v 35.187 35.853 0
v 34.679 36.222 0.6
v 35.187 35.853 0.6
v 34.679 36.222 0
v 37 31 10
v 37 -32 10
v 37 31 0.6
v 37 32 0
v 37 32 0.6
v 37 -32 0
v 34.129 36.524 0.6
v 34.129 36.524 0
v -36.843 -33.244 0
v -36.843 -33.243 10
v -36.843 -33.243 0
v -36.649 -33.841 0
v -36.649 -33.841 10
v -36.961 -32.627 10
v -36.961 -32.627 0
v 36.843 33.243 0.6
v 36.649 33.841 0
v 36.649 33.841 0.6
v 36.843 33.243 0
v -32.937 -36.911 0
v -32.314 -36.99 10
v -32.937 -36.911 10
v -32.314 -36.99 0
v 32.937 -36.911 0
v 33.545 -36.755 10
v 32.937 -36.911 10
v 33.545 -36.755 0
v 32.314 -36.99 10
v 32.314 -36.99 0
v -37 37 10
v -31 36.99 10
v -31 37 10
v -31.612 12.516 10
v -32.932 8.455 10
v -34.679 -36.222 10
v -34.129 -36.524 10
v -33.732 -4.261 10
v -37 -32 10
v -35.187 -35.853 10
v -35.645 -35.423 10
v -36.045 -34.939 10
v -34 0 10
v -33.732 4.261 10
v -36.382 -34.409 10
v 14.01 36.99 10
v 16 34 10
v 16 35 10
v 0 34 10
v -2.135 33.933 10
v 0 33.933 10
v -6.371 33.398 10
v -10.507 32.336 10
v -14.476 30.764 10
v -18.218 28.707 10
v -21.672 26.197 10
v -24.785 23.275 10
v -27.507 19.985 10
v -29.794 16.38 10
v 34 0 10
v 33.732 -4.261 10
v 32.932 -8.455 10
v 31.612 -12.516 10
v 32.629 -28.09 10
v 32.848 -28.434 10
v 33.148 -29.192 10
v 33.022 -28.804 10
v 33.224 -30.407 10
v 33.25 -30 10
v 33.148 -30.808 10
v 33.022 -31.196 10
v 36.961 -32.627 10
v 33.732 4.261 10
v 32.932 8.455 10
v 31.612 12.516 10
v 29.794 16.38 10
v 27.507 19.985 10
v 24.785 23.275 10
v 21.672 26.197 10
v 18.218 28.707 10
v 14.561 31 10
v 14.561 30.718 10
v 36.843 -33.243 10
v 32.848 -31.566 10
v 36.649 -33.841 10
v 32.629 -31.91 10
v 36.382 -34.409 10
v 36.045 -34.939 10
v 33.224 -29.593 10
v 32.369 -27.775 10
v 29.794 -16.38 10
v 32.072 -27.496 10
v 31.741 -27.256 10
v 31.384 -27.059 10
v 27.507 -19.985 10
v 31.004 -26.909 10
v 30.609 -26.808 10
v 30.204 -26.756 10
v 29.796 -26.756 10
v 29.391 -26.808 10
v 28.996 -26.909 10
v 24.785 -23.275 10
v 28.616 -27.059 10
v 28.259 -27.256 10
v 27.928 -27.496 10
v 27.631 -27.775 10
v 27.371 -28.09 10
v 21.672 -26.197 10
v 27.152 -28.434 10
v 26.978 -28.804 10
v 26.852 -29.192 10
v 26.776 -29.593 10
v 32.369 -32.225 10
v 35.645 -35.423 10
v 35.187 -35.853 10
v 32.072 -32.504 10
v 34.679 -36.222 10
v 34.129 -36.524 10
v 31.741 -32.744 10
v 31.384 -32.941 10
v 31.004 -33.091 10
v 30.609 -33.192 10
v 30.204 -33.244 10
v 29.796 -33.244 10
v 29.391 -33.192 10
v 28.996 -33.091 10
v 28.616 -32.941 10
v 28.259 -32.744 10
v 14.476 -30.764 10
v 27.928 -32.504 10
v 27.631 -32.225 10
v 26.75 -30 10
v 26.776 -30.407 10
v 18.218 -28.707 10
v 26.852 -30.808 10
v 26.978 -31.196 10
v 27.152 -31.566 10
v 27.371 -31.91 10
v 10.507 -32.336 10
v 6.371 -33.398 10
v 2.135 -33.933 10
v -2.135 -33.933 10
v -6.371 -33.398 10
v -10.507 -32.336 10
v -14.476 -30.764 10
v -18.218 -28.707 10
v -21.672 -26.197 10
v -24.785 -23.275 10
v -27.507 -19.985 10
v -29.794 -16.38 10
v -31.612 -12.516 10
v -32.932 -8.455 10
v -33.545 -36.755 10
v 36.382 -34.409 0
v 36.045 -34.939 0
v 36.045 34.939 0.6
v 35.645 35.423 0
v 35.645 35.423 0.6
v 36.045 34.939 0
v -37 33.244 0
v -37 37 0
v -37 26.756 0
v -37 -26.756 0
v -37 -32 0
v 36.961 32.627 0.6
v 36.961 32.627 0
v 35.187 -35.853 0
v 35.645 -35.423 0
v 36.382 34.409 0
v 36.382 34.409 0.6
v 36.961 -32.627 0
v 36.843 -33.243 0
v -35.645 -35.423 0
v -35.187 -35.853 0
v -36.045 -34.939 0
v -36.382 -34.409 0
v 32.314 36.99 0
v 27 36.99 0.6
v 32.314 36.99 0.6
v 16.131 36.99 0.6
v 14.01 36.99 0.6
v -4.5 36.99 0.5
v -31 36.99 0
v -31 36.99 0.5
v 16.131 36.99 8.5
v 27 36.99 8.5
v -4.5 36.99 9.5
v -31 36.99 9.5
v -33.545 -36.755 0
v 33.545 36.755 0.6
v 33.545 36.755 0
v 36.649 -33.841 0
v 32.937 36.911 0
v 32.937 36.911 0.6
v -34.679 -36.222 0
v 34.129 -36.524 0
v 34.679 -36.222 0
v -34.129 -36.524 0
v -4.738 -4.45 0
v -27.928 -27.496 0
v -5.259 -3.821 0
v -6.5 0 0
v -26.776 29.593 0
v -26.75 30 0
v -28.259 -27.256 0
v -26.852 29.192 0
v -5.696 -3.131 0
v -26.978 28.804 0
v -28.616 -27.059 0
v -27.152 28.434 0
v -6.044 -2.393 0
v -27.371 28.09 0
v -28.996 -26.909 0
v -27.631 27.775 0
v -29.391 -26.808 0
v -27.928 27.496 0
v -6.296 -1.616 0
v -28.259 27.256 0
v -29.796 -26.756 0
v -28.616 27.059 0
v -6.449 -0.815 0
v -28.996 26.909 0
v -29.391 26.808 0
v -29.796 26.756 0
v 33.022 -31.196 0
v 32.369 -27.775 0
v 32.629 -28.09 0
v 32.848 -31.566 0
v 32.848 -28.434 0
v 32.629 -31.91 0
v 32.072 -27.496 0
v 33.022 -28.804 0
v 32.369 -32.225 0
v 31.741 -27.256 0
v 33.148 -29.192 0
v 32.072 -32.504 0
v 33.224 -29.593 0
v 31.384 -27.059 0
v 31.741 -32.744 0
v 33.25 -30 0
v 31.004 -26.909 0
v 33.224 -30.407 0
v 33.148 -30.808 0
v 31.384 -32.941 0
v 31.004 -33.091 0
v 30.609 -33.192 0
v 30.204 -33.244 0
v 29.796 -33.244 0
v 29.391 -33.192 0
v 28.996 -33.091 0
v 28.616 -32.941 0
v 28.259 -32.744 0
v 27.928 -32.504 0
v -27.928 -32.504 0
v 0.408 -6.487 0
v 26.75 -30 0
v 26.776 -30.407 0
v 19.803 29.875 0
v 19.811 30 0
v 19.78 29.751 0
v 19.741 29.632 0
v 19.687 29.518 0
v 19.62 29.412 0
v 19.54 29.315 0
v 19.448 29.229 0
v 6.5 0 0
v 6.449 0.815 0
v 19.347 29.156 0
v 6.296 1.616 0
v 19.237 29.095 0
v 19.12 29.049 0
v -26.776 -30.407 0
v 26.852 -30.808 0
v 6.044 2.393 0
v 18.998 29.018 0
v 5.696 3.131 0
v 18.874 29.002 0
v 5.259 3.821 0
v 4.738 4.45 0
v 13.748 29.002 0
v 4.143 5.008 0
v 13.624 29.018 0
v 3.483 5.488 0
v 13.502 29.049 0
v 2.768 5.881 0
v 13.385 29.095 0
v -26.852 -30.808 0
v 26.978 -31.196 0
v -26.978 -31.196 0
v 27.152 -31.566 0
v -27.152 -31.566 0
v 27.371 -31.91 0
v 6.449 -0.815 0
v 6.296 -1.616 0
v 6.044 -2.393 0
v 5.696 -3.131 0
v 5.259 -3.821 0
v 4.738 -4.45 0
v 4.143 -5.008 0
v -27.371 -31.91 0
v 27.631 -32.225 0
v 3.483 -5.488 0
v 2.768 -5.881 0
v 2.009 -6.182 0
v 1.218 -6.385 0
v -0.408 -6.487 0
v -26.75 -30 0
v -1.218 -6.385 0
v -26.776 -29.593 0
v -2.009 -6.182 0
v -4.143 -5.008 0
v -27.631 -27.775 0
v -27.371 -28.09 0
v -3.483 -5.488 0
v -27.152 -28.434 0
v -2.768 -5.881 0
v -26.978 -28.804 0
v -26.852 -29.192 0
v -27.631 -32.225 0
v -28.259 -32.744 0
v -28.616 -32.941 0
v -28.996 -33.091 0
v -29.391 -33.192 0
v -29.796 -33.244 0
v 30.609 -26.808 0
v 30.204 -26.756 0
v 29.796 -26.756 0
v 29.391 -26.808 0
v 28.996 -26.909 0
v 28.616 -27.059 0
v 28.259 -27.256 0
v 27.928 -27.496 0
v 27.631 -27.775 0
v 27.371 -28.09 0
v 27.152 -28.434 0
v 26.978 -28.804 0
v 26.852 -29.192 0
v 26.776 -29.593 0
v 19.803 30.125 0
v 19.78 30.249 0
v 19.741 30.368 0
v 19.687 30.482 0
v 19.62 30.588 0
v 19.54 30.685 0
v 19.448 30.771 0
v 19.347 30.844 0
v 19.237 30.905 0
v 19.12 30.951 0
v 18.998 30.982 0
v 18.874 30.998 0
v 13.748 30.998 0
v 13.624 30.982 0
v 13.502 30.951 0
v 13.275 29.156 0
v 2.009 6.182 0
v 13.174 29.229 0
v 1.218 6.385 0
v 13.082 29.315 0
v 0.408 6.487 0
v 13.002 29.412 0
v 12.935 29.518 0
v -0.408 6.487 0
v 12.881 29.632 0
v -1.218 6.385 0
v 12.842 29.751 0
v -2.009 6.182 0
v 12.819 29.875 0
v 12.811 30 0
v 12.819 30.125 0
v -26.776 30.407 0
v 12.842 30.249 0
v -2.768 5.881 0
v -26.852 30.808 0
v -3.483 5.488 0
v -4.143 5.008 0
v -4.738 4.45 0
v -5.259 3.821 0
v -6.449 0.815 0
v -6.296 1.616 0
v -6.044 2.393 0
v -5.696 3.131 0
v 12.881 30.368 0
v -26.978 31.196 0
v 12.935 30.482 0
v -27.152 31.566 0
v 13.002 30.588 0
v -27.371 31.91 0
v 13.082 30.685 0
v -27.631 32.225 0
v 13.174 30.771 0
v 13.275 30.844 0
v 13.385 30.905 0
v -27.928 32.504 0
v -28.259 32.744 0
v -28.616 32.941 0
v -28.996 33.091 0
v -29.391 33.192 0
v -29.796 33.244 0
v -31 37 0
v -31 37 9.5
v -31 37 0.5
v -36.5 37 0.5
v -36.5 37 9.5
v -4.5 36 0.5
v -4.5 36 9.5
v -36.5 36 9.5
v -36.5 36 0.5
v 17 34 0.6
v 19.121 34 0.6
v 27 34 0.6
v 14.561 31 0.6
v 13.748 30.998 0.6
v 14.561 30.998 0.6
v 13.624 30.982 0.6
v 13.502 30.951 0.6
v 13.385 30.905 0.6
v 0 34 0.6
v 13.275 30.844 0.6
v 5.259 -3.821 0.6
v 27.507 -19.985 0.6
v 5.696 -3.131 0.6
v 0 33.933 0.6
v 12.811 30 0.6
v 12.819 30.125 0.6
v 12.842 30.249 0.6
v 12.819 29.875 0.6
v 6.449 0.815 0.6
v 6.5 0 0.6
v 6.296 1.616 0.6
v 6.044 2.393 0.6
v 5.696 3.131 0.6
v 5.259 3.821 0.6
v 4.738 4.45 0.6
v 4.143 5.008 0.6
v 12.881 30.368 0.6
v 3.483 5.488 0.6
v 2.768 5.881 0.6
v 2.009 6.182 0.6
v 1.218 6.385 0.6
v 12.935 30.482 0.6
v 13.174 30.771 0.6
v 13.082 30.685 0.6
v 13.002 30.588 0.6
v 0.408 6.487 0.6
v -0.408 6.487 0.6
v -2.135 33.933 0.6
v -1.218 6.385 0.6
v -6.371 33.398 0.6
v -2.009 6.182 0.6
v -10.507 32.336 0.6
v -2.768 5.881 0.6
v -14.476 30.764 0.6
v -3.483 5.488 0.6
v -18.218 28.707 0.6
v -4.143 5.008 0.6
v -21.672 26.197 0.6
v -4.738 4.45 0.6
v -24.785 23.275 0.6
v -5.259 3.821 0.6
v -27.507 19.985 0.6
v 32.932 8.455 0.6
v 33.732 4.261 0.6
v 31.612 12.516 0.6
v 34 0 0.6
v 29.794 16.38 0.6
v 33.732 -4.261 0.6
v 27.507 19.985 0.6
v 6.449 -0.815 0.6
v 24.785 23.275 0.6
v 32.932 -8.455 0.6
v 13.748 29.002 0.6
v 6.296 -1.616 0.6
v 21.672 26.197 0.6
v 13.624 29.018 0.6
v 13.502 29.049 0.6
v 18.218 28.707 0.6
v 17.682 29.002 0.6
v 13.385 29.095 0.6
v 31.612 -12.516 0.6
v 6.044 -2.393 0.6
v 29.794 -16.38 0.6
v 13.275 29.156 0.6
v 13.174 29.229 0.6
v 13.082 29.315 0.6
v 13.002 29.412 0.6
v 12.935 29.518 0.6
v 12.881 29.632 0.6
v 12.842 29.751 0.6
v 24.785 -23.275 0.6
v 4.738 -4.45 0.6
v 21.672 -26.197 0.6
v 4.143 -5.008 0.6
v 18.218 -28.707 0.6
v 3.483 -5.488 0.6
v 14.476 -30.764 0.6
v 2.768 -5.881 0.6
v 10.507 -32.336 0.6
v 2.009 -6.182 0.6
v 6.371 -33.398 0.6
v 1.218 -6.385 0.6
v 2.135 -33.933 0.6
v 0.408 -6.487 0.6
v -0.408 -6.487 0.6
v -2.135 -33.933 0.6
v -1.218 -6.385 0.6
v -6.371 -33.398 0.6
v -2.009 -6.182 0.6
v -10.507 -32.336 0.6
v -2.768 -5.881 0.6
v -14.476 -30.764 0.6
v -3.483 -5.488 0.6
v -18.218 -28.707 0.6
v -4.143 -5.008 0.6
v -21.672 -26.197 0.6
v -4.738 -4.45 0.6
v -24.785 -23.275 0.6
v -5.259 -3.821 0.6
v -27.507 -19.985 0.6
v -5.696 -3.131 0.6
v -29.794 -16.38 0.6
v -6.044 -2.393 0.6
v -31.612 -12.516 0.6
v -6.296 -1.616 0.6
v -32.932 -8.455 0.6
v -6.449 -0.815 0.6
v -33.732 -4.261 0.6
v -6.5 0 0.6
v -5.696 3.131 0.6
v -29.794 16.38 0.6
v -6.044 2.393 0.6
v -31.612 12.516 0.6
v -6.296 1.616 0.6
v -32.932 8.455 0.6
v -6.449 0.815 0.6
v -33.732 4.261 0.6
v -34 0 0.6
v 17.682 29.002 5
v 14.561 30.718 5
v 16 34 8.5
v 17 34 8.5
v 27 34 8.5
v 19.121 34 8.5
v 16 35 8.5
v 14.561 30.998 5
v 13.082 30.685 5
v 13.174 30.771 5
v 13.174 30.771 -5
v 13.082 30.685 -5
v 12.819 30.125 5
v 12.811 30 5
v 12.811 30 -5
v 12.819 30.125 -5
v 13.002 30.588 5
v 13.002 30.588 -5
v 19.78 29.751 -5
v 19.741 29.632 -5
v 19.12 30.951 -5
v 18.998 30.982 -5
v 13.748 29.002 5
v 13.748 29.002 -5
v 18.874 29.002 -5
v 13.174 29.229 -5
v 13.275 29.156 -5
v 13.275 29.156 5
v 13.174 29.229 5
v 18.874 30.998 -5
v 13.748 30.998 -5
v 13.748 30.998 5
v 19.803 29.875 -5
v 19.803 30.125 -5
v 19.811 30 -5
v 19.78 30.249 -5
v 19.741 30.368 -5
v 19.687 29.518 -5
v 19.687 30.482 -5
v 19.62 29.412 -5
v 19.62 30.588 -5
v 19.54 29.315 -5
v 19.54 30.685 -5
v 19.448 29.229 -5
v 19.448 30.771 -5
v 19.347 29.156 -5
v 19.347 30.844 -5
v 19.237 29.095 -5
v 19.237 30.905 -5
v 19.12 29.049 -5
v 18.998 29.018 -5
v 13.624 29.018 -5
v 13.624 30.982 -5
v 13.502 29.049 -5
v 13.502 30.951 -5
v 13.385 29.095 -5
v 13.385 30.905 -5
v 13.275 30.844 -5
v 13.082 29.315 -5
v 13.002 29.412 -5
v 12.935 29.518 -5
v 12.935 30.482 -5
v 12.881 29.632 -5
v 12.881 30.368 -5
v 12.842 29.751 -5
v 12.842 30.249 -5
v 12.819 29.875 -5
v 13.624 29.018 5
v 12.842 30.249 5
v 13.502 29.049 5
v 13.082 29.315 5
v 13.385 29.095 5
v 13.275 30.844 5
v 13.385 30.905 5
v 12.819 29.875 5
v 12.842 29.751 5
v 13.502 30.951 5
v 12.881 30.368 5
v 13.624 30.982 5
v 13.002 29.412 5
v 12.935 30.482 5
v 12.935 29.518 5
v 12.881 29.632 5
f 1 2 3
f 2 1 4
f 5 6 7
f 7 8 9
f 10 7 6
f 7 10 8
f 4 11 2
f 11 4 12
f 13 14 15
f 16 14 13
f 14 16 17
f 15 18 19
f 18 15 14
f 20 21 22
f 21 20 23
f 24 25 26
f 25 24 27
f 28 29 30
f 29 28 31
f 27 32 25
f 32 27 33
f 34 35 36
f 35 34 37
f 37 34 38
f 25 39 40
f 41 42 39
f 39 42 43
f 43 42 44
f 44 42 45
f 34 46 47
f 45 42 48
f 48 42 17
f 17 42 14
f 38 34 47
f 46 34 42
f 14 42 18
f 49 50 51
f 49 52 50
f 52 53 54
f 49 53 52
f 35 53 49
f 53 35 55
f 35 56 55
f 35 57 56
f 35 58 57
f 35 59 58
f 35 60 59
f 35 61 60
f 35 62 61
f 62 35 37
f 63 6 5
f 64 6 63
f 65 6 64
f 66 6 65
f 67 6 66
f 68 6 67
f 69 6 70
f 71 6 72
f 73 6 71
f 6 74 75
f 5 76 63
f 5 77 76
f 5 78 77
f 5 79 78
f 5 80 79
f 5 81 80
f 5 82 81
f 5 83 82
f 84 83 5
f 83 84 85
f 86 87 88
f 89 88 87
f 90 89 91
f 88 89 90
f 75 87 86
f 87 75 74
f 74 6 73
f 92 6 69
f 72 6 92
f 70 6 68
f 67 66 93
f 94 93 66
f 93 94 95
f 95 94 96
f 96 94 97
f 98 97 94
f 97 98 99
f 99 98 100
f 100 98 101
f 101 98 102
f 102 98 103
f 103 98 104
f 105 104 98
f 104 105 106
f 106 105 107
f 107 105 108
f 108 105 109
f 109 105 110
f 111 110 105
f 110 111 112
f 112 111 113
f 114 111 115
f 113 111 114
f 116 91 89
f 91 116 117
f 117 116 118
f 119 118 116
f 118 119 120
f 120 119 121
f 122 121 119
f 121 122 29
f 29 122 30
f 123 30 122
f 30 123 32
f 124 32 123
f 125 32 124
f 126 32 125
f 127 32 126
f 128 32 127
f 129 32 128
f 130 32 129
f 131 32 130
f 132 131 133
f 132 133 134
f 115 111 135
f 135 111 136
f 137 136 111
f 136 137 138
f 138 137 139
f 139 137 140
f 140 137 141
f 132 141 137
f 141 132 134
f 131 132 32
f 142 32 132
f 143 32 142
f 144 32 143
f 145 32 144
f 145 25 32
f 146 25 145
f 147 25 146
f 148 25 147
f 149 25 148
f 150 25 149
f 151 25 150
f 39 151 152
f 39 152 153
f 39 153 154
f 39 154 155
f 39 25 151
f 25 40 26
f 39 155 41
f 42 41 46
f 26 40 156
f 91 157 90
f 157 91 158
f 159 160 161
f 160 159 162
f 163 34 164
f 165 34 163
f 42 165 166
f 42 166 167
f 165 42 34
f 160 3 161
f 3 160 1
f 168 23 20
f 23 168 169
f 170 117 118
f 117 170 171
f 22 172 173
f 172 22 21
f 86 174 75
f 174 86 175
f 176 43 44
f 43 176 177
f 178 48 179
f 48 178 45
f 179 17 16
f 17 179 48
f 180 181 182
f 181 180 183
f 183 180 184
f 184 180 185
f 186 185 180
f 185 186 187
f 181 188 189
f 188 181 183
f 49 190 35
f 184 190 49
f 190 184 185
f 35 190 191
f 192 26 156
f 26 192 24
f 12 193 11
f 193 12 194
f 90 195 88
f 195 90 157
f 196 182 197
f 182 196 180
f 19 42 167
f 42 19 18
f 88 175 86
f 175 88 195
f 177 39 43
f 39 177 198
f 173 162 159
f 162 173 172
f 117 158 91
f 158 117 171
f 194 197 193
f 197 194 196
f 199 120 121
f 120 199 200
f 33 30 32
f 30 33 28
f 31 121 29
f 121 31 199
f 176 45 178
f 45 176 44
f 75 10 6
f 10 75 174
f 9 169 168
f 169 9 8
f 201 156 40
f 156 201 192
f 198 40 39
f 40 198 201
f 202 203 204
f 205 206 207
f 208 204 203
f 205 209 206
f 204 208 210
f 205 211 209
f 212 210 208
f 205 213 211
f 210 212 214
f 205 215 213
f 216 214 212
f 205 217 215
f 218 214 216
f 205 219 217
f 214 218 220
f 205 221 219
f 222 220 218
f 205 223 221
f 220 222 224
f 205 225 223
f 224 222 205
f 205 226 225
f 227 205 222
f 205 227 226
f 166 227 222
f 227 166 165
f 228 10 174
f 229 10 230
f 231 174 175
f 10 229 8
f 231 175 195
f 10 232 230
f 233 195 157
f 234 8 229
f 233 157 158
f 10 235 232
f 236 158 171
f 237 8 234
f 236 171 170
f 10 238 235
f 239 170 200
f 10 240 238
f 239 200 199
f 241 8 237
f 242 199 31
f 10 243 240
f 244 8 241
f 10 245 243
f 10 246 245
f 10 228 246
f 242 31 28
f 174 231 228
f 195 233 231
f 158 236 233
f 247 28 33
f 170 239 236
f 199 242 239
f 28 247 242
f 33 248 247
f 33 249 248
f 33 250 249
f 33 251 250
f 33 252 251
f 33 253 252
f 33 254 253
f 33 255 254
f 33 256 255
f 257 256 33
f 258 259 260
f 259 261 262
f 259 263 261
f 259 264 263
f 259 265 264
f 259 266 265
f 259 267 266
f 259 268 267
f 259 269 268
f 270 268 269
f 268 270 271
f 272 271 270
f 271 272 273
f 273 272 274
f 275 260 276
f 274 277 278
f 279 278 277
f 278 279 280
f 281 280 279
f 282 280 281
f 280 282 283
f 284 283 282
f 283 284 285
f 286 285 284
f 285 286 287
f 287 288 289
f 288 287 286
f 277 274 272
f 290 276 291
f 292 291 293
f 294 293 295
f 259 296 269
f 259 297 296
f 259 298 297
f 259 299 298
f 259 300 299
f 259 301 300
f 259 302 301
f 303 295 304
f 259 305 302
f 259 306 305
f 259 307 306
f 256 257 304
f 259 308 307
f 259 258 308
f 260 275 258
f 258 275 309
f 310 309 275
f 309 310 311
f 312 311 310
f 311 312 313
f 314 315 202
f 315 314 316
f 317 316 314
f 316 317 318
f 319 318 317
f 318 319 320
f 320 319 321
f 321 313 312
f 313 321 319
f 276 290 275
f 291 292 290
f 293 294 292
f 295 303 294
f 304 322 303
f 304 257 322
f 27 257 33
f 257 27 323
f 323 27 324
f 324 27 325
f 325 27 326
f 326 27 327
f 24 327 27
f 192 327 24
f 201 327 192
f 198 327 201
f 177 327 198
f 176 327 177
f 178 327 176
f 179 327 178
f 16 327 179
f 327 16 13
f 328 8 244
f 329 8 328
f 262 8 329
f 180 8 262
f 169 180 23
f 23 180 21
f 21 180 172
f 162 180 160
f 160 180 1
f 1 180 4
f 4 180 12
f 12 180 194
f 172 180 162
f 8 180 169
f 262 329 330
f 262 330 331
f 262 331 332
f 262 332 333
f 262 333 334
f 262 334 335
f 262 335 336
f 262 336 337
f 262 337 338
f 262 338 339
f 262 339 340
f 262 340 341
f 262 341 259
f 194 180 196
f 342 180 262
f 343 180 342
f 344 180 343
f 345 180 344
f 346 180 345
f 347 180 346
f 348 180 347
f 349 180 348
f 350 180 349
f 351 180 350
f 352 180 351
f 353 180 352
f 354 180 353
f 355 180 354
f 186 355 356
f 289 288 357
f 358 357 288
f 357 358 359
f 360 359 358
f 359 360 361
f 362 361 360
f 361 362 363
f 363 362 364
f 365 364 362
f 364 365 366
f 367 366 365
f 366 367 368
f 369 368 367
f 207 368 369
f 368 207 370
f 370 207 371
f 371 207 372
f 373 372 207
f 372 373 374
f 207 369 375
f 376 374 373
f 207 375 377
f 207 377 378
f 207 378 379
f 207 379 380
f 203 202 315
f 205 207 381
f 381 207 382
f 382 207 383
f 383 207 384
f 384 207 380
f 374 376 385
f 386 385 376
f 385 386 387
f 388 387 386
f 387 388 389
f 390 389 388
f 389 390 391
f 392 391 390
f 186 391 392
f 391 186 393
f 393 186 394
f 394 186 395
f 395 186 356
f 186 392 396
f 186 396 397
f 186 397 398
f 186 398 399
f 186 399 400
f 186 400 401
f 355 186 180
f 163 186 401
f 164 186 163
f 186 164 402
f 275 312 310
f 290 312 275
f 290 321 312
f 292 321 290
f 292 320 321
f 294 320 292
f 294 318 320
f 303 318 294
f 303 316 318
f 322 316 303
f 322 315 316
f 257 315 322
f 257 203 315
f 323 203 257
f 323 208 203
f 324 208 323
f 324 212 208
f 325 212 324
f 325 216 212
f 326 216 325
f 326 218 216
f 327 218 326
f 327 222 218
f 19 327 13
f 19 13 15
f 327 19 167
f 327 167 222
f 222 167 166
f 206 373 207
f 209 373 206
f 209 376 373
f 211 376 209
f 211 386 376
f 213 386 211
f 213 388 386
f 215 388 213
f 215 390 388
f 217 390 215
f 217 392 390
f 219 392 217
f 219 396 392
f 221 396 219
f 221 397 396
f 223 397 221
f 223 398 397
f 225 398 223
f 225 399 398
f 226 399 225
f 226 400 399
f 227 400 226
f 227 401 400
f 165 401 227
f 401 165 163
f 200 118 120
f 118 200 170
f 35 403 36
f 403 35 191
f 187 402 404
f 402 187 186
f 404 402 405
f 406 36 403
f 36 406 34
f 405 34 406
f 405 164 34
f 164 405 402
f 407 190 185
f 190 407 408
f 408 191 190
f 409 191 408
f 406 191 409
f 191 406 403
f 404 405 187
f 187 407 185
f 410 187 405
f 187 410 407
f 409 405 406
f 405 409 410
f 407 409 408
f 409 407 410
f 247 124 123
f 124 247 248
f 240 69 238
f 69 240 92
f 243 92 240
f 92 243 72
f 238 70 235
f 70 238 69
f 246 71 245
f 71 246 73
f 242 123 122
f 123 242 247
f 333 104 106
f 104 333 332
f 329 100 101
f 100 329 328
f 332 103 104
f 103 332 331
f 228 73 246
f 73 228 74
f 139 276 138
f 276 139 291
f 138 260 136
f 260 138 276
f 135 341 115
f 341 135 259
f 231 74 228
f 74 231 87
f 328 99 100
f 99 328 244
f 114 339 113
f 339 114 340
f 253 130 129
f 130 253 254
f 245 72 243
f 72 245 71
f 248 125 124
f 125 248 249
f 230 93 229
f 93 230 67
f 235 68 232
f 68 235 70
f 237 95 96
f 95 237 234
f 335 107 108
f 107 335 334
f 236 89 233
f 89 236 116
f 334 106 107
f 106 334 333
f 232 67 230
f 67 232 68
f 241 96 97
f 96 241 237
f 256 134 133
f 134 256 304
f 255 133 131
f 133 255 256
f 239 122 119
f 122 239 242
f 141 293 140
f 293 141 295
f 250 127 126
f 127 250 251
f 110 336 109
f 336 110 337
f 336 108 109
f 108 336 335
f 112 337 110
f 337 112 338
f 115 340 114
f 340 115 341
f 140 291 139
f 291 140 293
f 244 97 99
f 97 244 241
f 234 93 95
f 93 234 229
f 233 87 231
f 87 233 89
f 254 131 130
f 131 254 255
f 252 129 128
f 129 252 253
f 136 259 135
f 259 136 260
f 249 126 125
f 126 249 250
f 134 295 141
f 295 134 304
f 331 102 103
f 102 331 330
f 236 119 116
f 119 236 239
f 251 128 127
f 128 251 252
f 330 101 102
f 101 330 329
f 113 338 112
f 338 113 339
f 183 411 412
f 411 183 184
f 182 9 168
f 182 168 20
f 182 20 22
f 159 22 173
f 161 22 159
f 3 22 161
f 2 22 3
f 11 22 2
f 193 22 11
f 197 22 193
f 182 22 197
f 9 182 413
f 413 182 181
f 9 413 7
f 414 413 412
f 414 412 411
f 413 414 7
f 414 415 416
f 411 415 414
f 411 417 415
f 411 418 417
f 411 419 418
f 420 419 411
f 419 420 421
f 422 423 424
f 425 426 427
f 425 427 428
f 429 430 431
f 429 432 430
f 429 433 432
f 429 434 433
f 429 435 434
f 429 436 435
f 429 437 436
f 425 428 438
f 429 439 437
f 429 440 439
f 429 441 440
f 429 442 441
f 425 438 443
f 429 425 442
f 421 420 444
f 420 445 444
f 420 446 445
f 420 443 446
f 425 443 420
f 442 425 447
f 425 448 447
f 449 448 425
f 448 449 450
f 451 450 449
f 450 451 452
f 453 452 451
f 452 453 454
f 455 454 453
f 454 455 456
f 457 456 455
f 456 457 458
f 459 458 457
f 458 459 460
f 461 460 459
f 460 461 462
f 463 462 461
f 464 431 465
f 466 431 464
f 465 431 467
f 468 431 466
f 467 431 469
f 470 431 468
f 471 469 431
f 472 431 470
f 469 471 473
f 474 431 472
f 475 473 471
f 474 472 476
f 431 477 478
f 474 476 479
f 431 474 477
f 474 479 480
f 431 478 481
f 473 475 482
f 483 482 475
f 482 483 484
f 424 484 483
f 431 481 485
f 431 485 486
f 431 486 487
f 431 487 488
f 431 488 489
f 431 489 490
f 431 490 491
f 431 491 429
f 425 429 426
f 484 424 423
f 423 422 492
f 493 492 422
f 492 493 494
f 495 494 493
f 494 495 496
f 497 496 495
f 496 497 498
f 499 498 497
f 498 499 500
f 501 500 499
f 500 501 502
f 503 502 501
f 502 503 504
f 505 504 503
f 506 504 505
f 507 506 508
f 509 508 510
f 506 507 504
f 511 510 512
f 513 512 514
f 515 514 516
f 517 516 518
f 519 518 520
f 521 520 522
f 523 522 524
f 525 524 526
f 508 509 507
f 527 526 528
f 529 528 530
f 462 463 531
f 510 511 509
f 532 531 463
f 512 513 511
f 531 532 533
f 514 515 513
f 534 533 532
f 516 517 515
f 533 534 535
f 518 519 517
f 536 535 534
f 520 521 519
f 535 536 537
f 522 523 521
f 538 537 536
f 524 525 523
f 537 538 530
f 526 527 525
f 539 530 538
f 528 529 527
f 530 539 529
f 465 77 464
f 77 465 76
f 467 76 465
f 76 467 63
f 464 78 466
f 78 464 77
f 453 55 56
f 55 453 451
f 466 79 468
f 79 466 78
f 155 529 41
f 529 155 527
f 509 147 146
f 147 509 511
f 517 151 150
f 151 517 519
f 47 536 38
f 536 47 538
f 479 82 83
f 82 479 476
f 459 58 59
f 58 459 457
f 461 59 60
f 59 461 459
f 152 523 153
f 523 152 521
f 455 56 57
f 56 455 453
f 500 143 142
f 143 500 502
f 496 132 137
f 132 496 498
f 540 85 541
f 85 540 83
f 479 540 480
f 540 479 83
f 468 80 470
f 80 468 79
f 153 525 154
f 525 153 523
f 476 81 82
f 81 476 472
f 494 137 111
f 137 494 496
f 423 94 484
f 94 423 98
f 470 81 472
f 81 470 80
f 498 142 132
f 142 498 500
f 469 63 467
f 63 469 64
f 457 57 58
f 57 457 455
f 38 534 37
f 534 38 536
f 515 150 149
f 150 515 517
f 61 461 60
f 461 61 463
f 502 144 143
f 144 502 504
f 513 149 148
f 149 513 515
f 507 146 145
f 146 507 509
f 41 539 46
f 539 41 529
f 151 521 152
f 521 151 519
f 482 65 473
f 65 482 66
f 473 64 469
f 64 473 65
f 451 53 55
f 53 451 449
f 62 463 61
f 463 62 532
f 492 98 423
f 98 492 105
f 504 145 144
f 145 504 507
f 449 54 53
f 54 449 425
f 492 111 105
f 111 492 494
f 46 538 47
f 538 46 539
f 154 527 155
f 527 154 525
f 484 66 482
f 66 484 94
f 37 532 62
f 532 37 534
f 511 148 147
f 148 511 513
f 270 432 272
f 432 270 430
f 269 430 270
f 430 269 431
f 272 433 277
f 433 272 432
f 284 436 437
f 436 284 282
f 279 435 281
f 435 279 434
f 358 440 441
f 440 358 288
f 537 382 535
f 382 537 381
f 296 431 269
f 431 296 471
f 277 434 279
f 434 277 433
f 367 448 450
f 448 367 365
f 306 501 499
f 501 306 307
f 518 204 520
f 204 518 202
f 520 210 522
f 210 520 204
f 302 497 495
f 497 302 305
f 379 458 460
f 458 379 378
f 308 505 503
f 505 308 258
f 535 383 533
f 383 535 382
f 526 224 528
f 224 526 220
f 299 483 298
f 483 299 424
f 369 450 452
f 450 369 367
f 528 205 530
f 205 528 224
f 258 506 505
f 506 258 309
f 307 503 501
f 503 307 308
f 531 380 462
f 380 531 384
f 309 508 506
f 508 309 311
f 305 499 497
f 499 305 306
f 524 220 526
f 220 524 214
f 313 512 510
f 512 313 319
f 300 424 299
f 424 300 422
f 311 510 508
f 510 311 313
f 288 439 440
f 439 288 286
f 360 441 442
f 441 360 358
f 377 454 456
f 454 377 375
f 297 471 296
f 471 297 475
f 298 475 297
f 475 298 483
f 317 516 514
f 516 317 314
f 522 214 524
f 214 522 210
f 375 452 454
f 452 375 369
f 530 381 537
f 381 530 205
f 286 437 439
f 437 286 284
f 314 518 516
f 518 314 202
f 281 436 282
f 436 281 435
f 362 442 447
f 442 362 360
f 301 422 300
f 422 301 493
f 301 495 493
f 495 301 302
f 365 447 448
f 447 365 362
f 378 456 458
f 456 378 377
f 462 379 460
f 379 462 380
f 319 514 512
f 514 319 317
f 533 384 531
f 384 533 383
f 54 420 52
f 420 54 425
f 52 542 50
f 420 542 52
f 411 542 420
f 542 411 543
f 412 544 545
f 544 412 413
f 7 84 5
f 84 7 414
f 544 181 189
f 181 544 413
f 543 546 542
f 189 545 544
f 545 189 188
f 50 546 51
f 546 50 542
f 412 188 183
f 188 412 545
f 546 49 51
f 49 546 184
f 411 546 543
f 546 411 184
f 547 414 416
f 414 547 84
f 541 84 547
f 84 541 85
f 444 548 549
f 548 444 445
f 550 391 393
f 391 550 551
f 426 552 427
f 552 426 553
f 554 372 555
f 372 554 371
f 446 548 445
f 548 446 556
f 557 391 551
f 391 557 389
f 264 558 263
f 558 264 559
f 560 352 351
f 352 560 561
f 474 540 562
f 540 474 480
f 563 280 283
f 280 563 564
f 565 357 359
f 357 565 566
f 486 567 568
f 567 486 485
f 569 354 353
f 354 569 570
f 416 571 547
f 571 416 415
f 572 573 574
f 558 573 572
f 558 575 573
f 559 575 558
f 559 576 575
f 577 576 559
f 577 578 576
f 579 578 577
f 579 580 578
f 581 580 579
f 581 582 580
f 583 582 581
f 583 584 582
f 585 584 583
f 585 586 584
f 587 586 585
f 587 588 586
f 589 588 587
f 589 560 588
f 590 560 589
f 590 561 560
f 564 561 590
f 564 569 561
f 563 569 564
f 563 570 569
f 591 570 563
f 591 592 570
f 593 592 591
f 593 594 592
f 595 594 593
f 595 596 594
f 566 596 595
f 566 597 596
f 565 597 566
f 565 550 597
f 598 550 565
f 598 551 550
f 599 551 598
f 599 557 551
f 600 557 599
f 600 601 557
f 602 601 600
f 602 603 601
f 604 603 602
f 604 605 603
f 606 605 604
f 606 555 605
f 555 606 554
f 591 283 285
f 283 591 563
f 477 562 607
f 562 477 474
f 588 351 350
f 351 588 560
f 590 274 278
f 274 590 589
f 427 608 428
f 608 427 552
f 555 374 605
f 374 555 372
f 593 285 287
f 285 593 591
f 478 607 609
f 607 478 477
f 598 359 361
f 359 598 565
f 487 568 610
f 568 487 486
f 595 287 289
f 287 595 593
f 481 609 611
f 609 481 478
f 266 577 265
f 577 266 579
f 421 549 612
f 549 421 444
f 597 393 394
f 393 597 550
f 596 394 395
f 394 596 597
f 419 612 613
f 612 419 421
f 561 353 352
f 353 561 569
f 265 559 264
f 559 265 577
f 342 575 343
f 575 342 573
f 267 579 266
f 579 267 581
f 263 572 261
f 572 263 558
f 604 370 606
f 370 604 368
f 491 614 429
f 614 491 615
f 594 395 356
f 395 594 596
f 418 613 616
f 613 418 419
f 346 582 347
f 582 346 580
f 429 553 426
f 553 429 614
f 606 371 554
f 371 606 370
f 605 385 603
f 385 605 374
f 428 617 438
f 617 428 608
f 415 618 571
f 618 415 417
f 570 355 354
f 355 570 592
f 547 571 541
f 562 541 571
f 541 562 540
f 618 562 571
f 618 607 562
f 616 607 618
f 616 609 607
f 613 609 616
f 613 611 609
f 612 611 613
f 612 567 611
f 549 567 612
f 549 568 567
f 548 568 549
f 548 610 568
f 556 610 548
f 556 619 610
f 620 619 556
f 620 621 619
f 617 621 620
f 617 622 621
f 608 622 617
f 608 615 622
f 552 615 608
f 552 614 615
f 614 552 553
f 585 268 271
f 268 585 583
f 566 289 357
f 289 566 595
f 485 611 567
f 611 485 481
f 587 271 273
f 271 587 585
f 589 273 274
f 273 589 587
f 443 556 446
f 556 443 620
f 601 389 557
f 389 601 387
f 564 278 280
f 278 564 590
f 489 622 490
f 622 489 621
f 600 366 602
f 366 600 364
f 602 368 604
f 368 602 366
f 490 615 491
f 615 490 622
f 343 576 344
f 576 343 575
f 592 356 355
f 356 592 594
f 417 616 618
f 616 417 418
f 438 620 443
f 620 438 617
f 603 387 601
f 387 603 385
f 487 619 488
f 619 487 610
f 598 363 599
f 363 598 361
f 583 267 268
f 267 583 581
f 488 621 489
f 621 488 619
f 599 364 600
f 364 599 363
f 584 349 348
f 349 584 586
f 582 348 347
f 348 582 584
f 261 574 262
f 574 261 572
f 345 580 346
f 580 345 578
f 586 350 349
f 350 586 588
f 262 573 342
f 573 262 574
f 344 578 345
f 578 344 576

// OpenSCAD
$fn = 50;


union() {
	difference() {
		union() {
			hull() {
				translate(v = [-32.0000000000, 32.0000000000, 0]) {
					cylinder(h = 10, r = 5);
				}
				translate(v = [32.0000000000, 32.0000000000, 0]) {
					cylinder(h = 10, r = 5);
				}
				translate(v = [-32.0000000000, -32.0000000000, 0]) {
					cylinder(h = 10, r = 5);
				}
				translate(v = [32.0000000000, -32.0000000000, 0]) {
					cylinder(h = 10, r = 5);
				}
			}
			translate(v = [-37.0000000000, 31.0000000000, 0]) {
				cube(size = [6, 6, 10]);
			}
		}
		union() {
			translate(v = [-37.5000000000, -30.0000000000, -250.0000000000]) {
				rotate(a = [0, 0, 0]) {
					difference() {
						union() {
							hull() {
								translate(v = [7.5000000000, 0, 0]) {
									cylinder(h = 250, r = 3.2500000000, r1 = 3.2500000000, r2 = 3.2500000000);
								}
								translate(v = [-7.5000000000, 0, 0]) {
									cylinder(h = 250, r = 3.2500000000, r1 = 3.2500000000, r2 = 3.2500000000);
								}
							}
						}
						union();
					}
				}
			}
			translate(v = [-37.5000000000, 30.0000000000, -250.0000000000]) {
				rotate(a = [0, 0, 0]) {
					difference() {
						union() {
							hull() {
								translate(v = [7.5000000000, 0, 0]) {
									cylinder(h = 250, r = 3.2500000000, r1 = 3.2500000000, r2 = 3.2500000000);
								}
								translate(v = [-7.5000000000, 0, 0]) {
									cylinder(h = 250, r = 3.2500000000, r1 = 3.2500000000, r2 = 3.2500000000);
								}
							}
						}
						union();
					}
				}
			}
			translate(v = [-36.5000000000, 36.0000000000, 0.5000000000]) {
				cube(size = [32, 1, 9.0000000000]);
			}
			translate(v = [30.0000000000, -30.0000000000, 0]) {
				cylinder(h = 100, r = 3.2500000000);
			}
			translate(v = [0, 0, 0.6000000000]) {
				cylinder(h = 12.4000000000, r = 34.0000000000);
			}
			translate(v = [0, 0, -5.0000000000]) {
				cylinder(h = 10, r = 6.5000000000);
			}
			translate(v = [0.0000000000, 31.0000000000, 0.6000000000]) {
				cube(size = [37.0000000000, 3, 12.4000000000]);
			}
			translate(v = [27.0000000000, 31.0000000000, 0.6000000000]) {
				cube(size = [10, 6, 12.4000000000]);
			}
			translate(v = [16.0000000000, 31.0000000000, 8.5000000000]) {
				cube(size = [21, 6, 1.5000000000]);
			}
			translate(v = [13.2500000000, 37.7500000000, 0.6000000000]) {
				rotate(a = [0, 0, -45]) {
					cube(size = [7.5000000000, 1.5000000000, 12.4000000000]);
				}
			}
			translate(v = [7.0610000000, 29.0000000000, 0.6000000000]) {
				cube(size = [7.5000000000, 2, 9.4000000000]);
			}
		}
	}
	union() {
		translate(v = [16.3110000000, 30.0000000000, -5.0000000000]) {
			rotate(a = [0, 0, 0]) {
				difference() {
					union() {
						#hull() {
							#translate(v = [2.5000000000, 0, 0]) {
								cylinder(h = 10, r = 1.0000000000, r1 = 1.0000000000, r2 = 1.0000000000);
							}
							#translate(v = [-2.5000000000, 0, 0]) {
								cylinder(h = 10, r = 1.0000000000, r1 = 1.0000000000, r2 = 1.0000000000);
							}
						}
					}
					union();
				}
			}
		}
	}
}
